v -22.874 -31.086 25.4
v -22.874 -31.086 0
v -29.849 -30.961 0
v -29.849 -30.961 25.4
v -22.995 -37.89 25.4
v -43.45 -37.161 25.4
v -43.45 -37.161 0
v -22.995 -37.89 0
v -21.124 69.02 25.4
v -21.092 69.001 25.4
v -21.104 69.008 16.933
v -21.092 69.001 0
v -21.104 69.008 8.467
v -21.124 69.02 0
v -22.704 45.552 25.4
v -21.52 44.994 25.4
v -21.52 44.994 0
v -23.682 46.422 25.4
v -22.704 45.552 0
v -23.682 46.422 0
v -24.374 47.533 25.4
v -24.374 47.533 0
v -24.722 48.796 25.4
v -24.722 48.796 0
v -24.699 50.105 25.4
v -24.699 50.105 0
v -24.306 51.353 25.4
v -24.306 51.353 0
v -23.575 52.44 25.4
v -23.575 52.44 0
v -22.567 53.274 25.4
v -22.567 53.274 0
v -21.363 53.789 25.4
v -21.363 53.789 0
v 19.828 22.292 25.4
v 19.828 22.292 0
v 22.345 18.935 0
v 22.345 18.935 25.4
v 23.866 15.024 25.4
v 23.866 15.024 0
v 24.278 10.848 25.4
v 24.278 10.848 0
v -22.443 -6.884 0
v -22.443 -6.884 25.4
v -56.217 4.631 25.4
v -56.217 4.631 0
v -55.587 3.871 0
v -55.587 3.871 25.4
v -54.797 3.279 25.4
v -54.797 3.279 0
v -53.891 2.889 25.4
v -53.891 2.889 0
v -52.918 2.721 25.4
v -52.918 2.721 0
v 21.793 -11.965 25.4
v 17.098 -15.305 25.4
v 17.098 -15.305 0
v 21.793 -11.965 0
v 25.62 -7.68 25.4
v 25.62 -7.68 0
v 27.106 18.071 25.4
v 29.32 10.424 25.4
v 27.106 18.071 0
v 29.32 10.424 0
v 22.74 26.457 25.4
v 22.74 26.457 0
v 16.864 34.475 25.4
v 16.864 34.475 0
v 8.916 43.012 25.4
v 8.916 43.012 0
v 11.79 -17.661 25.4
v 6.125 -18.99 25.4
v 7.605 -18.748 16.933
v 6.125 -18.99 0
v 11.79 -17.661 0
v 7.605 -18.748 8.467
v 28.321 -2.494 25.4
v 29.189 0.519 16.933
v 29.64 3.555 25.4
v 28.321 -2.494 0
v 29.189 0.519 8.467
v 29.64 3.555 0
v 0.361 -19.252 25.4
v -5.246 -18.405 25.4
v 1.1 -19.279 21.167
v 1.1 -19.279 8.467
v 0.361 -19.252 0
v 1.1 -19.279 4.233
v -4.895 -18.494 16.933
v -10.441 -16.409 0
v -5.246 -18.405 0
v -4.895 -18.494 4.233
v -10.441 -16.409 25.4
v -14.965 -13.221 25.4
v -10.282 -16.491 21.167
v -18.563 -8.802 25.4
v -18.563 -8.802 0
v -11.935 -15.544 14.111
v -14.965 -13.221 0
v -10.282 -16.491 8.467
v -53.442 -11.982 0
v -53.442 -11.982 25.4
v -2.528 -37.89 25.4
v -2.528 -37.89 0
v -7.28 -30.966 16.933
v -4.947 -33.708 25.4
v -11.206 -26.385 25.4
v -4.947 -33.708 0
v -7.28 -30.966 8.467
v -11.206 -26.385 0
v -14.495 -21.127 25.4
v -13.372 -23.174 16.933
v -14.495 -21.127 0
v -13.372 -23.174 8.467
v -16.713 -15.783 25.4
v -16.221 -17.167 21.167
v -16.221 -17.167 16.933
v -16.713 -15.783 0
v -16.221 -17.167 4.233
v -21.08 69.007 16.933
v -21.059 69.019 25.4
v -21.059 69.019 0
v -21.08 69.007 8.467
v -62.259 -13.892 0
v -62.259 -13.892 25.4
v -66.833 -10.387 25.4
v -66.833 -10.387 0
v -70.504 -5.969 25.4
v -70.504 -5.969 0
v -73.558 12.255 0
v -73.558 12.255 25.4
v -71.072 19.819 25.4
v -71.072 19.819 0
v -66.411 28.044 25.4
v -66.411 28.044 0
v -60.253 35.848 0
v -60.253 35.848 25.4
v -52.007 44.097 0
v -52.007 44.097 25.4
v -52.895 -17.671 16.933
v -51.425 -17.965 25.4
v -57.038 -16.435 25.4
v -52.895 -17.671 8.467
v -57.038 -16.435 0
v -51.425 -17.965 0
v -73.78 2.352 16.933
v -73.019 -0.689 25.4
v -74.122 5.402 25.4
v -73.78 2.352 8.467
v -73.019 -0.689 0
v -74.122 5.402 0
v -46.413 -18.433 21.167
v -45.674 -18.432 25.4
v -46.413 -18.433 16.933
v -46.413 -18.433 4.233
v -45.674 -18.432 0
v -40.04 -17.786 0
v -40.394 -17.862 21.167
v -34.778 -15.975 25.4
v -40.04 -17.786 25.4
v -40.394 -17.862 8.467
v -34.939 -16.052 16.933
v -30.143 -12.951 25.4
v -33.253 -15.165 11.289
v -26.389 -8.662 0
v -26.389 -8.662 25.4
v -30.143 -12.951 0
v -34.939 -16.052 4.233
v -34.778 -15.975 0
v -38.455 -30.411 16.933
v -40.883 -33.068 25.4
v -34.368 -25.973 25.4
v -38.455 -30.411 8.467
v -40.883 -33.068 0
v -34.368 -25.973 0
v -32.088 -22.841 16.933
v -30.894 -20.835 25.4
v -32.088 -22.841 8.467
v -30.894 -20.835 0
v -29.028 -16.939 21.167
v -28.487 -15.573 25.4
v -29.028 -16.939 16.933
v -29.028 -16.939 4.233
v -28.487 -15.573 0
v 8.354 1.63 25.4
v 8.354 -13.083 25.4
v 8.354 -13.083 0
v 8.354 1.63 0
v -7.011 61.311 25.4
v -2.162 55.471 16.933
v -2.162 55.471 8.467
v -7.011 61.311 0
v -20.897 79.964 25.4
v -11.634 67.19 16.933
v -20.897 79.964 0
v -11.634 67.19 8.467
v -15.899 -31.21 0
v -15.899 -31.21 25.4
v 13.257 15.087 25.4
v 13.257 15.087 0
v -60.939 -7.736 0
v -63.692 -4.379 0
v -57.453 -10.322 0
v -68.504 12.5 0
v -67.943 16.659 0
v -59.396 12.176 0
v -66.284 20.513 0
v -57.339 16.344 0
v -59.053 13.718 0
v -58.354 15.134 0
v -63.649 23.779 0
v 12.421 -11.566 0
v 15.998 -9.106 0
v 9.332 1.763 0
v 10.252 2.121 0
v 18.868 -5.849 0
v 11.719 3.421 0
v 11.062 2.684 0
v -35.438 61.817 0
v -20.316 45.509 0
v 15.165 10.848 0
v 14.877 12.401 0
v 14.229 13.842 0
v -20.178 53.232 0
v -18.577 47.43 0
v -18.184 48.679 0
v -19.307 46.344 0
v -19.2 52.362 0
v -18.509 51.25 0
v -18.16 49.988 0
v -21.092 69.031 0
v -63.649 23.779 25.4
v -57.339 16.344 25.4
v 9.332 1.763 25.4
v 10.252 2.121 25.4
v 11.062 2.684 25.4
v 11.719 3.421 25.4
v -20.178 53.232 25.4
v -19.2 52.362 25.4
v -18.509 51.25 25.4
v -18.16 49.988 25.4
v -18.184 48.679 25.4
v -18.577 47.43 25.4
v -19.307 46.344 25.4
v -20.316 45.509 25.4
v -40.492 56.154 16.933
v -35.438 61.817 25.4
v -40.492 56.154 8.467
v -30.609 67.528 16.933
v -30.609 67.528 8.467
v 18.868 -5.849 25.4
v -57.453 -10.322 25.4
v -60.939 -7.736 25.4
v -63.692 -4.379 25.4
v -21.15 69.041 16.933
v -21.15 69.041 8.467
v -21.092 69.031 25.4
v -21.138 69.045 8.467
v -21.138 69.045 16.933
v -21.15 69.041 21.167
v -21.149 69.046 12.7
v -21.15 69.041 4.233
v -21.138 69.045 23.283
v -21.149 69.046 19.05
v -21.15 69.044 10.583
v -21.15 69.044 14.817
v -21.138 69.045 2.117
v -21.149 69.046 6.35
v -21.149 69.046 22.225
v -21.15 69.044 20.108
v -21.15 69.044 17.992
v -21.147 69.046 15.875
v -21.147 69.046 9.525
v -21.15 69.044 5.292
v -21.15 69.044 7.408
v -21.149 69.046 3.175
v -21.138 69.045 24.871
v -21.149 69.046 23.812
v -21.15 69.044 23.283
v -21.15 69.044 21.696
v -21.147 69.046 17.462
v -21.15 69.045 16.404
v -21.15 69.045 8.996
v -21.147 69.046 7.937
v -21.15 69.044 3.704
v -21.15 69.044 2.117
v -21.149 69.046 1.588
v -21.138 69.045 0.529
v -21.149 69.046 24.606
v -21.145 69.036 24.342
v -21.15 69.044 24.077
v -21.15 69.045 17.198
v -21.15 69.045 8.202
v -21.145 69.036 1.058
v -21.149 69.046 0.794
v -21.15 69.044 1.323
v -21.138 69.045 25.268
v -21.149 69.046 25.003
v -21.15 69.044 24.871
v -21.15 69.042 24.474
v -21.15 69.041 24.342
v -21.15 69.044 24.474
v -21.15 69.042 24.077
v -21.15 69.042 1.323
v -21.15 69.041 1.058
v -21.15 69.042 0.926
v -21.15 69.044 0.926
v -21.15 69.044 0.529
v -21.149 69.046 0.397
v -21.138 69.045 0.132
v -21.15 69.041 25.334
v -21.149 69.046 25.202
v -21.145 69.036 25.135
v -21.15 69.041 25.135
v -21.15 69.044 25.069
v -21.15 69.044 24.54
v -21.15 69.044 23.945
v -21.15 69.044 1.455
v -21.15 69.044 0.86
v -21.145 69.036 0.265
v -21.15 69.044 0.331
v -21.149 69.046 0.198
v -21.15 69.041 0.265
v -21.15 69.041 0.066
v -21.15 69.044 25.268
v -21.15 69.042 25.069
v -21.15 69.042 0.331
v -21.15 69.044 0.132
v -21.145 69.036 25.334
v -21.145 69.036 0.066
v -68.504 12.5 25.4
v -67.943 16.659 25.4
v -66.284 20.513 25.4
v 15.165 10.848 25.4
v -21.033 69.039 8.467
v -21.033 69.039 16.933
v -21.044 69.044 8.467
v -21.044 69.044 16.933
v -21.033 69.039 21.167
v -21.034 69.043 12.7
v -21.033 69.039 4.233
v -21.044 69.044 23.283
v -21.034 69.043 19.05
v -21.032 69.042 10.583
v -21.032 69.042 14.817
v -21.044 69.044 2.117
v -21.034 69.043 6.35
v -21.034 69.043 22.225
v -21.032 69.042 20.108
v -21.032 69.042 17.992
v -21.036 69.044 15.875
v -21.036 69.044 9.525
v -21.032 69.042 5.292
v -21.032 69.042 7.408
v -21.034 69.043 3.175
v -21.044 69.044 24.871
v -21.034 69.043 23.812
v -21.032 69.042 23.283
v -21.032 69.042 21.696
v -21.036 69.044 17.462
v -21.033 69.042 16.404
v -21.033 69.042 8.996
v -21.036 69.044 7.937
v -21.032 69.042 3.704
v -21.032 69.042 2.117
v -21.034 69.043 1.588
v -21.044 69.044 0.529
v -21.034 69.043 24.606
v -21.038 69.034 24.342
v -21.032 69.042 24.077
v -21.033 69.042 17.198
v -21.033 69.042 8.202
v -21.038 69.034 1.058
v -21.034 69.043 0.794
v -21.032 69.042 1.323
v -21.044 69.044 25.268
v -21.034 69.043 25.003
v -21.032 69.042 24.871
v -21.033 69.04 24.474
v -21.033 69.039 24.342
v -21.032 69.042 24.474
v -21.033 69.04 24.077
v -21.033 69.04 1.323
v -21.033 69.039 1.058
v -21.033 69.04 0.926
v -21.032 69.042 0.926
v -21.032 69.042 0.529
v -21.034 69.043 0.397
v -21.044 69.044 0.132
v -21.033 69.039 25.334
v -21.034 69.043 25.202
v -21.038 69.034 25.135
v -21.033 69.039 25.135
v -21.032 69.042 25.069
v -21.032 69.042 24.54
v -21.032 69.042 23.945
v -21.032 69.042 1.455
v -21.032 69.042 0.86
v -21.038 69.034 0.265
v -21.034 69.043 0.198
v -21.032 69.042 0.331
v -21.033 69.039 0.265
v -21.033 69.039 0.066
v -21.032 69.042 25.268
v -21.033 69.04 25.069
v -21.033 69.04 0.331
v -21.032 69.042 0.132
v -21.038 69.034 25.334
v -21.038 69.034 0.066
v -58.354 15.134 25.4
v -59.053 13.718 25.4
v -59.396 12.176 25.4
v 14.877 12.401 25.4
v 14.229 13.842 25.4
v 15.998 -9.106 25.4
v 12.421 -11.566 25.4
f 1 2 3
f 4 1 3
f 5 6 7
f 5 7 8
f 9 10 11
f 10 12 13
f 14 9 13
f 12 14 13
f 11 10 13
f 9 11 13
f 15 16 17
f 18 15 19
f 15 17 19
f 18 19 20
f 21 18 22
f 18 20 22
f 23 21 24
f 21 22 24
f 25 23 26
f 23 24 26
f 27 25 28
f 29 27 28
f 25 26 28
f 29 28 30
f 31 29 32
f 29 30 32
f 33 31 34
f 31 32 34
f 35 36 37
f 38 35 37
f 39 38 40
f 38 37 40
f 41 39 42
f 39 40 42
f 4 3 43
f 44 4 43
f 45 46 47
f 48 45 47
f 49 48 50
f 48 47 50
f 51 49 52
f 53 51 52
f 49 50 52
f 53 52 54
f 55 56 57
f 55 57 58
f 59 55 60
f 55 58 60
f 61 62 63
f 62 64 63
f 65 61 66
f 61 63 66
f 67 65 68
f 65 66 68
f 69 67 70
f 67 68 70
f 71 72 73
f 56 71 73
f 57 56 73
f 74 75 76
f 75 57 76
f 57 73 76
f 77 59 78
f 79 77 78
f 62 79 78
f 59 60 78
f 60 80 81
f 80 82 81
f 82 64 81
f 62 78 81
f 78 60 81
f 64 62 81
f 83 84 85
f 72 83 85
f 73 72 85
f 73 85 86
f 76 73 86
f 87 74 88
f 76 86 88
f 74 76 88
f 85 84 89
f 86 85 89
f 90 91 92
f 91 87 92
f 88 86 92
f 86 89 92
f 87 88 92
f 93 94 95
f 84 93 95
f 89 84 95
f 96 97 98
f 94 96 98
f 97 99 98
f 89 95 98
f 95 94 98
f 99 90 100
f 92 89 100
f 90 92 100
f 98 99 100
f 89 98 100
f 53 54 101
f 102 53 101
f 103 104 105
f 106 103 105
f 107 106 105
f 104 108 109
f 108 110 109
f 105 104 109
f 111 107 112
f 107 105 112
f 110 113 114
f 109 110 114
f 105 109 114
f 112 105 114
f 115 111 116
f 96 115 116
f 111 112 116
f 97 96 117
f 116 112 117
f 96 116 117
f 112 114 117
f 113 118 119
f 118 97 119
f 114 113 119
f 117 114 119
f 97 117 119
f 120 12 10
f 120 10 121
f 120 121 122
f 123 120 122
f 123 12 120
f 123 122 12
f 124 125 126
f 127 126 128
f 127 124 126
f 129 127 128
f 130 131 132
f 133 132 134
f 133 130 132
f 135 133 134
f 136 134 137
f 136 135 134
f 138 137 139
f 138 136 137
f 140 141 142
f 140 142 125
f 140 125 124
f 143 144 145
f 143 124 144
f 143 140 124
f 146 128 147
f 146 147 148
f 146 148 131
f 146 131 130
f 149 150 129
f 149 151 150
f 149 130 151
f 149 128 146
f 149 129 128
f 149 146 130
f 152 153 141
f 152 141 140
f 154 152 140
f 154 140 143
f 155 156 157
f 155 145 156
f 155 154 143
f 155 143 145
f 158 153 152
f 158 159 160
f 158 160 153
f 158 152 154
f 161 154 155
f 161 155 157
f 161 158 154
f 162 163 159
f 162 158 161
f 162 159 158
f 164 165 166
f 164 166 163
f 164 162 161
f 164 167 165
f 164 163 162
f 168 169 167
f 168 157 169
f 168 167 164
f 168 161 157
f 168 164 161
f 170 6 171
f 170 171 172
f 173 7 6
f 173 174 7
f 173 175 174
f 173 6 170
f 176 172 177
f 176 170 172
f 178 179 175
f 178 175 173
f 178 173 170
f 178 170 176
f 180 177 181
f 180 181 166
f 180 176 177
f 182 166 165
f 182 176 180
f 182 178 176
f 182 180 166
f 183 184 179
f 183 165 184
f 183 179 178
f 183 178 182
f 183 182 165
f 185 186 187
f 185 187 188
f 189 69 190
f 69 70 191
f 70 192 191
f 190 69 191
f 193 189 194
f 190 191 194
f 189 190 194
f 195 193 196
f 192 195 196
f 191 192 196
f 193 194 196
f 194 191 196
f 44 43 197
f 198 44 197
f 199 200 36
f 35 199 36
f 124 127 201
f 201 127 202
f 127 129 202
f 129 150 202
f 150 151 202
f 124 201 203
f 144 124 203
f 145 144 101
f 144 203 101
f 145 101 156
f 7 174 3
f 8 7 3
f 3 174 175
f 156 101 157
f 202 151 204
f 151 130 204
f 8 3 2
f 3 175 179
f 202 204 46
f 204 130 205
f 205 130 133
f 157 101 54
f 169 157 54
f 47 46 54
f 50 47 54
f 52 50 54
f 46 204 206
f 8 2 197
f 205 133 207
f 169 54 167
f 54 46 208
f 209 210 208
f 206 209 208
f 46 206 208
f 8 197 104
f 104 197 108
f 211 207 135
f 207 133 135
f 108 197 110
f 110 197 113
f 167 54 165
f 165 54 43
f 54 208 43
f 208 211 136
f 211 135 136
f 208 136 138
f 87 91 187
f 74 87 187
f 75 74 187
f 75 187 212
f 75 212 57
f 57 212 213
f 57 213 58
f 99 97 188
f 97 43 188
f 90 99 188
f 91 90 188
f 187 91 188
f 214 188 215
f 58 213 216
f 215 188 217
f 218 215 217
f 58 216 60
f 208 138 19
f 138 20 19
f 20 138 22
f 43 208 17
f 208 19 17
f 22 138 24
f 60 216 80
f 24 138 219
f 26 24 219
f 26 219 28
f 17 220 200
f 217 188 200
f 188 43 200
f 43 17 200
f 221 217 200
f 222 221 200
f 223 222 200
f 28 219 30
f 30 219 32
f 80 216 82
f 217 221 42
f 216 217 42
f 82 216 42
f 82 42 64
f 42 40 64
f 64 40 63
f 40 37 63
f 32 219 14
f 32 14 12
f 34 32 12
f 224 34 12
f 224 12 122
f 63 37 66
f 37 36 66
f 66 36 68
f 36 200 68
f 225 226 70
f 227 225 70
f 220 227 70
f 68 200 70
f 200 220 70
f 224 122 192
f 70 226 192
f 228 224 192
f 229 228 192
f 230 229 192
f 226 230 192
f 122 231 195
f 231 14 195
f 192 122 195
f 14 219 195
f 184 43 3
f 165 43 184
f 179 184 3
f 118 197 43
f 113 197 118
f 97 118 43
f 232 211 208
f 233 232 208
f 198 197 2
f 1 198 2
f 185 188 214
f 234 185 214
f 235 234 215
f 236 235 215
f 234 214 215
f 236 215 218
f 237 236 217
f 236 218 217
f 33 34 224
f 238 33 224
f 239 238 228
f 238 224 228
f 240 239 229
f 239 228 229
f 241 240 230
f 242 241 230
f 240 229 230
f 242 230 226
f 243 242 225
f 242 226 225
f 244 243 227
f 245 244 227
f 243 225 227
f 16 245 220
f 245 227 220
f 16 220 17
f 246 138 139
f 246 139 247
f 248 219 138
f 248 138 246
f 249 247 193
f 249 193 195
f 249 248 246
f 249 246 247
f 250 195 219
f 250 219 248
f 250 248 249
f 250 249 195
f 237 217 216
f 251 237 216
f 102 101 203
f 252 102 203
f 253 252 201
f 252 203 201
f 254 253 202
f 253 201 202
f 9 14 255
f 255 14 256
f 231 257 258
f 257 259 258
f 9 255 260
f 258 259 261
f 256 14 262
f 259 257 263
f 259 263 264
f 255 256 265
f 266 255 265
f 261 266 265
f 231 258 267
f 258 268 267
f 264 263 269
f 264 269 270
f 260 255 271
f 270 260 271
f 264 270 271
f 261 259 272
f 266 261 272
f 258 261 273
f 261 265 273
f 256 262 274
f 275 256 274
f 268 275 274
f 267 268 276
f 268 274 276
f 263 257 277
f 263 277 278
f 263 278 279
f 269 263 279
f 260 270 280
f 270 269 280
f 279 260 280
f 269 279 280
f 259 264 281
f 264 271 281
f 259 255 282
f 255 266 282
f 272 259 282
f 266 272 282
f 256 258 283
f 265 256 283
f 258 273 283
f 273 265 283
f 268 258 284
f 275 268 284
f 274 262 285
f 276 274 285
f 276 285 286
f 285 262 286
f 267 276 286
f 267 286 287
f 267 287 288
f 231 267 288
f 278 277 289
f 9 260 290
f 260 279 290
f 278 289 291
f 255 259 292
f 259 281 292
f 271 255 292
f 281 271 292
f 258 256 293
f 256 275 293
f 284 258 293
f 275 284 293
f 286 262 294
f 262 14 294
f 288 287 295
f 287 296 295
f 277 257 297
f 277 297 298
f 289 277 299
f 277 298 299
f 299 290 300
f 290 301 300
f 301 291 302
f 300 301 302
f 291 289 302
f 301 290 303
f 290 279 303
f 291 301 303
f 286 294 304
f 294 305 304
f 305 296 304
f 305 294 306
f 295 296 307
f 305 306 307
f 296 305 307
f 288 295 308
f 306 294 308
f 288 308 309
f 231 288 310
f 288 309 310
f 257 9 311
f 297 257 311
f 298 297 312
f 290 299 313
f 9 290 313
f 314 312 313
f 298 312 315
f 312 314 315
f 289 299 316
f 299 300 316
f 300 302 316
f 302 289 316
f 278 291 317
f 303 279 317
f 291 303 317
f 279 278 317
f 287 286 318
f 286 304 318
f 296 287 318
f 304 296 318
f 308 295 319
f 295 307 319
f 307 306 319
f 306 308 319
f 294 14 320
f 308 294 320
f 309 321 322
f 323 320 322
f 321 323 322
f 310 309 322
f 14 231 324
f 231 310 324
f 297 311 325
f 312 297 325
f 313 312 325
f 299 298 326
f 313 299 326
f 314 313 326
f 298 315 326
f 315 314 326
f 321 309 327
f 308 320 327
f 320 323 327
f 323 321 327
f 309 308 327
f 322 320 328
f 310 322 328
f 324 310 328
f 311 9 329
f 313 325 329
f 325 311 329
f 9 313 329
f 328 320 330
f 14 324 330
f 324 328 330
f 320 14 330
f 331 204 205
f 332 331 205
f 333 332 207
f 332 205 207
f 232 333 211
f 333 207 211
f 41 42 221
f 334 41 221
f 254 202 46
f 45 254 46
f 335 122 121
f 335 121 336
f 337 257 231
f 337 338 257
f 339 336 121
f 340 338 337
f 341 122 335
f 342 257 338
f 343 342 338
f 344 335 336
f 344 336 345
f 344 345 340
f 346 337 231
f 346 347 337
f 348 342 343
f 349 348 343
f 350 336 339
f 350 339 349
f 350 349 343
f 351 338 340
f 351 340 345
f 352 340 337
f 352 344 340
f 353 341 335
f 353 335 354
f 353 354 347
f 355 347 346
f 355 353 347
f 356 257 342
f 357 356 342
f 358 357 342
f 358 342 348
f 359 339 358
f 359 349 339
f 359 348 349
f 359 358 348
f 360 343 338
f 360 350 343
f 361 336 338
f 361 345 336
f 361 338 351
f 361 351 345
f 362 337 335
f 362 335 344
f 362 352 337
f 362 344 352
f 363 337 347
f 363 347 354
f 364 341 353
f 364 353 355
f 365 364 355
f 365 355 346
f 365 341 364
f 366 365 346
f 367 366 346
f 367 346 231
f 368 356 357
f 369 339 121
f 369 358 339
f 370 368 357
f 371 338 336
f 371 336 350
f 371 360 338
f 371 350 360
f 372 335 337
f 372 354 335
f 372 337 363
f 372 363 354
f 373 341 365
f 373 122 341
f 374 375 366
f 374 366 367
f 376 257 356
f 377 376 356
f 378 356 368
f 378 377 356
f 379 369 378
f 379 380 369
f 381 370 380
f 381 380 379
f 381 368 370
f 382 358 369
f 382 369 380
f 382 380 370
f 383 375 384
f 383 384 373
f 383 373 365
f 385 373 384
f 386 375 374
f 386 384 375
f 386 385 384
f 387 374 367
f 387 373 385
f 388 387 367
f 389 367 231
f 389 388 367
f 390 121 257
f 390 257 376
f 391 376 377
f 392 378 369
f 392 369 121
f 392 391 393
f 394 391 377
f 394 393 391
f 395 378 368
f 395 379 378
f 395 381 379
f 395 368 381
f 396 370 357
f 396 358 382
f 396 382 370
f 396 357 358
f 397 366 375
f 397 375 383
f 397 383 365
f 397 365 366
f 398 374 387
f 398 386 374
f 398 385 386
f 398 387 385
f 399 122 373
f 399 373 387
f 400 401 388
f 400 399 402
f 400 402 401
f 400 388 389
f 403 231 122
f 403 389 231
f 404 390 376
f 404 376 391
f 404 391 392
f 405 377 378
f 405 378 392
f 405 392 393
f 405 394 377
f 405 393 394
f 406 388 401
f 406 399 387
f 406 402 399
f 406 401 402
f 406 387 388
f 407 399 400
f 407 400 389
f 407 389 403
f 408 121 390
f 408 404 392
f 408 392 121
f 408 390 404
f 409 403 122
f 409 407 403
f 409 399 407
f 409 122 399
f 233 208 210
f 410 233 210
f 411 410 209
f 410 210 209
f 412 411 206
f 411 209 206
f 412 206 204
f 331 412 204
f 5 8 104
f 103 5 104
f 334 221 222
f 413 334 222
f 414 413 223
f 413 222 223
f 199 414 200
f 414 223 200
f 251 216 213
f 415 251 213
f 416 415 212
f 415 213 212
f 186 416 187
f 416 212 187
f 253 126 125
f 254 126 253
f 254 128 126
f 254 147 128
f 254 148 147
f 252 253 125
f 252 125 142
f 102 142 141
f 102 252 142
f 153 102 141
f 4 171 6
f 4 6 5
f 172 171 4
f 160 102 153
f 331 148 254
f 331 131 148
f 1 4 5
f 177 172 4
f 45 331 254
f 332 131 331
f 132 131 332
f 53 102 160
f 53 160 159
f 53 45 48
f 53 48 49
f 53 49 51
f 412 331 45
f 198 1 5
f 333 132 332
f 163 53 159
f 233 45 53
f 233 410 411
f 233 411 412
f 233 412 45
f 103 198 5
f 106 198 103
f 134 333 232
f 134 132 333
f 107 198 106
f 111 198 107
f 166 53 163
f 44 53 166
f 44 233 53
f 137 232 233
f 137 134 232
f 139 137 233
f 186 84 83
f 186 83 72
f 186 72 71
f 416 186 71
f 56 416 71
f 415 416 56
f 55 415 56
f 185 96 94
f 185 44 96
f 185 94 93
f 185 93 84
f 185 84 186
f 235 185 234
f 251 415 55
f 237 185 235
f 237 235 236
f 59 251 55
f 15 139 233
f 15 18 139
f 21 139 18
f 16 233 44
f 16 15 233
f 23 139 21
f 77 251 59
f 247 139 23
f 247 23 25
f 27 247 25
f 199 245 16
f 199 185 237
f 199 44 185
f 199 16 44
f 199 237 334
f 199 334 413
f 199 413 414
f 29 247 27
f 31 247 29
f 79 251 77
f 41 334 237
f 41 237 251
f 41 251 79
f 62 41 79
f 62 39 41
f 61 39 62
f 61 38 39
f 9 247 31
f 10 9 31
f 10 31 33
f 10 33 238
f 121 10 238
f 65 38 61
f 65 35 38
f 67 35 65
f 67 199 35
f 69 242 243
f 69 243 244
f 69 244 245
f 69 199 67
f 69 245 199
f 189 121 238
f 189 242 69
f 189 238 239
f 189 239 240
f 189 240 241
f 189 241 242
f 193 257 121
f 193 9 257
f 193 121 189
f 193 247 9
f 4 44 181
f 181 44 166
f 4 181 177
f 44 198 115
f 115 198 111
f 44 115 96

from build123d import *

# Parameters (mm, degrees)
F0_W     = 4.7442697883
F0_H     = 1.9113573674
F0_W_2   = 4.7634891234
F0_H_2   = 1.468620263
F0_W_3   = 4.128358094
F0_H_3   = 1.4289282262
F1_DEPTH = 25.4


# Not quite as in the source:
# - a feature names something its author has since deleted; it is built from what else it names


with BuildPart() as f1:
    # F0 (on Top) → F1 (new body)
    with BuildSketch(Plane.XY):
        with BuildLine():
            Line((-22.9954444695, -37.8900244832), (-2.5283634938, -37.8900244832))
            add(Edge.make_bspline(
                [(-2.5283634938, -37.8900244832), (-5.8608135484, -29.4962804765), (-14.5712196827, -28.3677466214), (-18.5634065419, -8.8018402457)],
                knots=[0, 0, 0, 0, 33.2151331141, 33.2151331141, 33.2151331141, 33.2151331141], degree=3))
            add(Edge.make_bspline(
                [(-18.5634065419, -8.8018402457), (-2.5283634938, -35.3494078415), (62.5428706408, -9.0993279591), (8.9163342491, 43.0122725666)],
                knots=[0, 0, 0, 0, 58.6501358947, 58.6501358947, 58.6501358947, 58.6501358947], degree=3))
            add(Edge.make_bspline(
                [(8.9163342491, 43.0122725666), (-3.4306221642, 56.4400143921), (-11.2726483494, 66.0635232925), (-20.8969525993, 79.9641385674)],
                knots=[0, 0, 0, 0, 47.47917937, 47.47917937, 47.47917937, 47.47917937], degree=3))
            add(Edge.make_bspline(
                [(-52.0068416032, 44.0970606294), (-39.1896790872, 57.0767342864), (-31.0100233031, 66.4149637492), (-20.8969525993, 79.9641385674)],
                knots=[0, 0, 0, 0, 47.47917937, 47.47917937, 47.47917937, 47.47917937], degree=3))
            add(Edge.make_bspline(
                [(-26.3891224094, -8.6624968343), (-43.3591045439, -34.6223823726), (-107.454577438, -6.07238132), (-52.0068416032, 44.0970606294)],
                knots=[0, 0, 0, 0, 58.6501358947, 58.6501358947, 58.6501358947, 58.6501358947], degree=3))
            add(Edge.make_bspline(
                [(-43.4495514732, -37.1613885312), (-39.8203933268, -28.8916017766), (-31.0753324327, -28.0738771005), (-26.3891224094, -8.6624968343)],
                knots=[0, 0, 0, 0, 33.2151331141, 33.2151331141, 33.2151331141, 33.2151331141], degree=3))
            Line((-43.4495514732, -37.1613885312), (-22.9954444695, -37.8900244832))
        make_face()
        Polygon((-29.84915008, -30.9614511052), (-22.4433610347, -6.8842664576), (-15.8994235098, -31.2098376453), (-22.8742867949, -31.0856443752), align=None, mode=Mode.SUBTRACT)
        with BuildLine():
            add(Edge.make_bspline(
                [(-22.3207809169, 0), (-10.655029352, -32.6894562044), (59.6865899861, -11.1531224102), (7.7575119212, 41.9883653522)],
                knots=[0, 0, 0, 0, 51.6500389642, 51.6500389642, 51.6500389642, 51.6500389642], degree=3))
            add(Edge.make_bspline(
                [(-22.3207809169, 0), (-35.1428948343, -32.2534292936), (-104.6732232363, -8.2265585713), (-50.8852053371, 43.0325479438)],
                knots=[0, 0, 0, 0, 51.6500389642, 51.6500389642, 51.6500389642, 51.6500389642], degree=3))
            Line((-50.8852053371, 43.0325479438), (-20.973111277, 75.6869634445))
            Line((-20.973111277, 75.6869634445), (7.7575119212, 41.9883653522))
        make_face(mode=Mode.SUBTRACT)
        with BuildLine():
            add(Edge.make_bspline(
                [(-22.3207809169, 0), (-35.1428948343, -32.2534292936), (-104.6732232363, -8.2265585713), (-50.8852053371, 43.0325479438)],
                knots=[0, 0, 0, 0, 51.6500389642, 51.6500389642, 51.6500389642, 51.6500389642], degree=3))
            add(Edge.make_bspline(
                [(-22.3207809169, 0), (-10.655029352, -32.6894562044), (59.6865899861, -11.1531224102), (7.7575119212, 41.9883653522)],
                knots=[0, 0, 0, 0, 51.6500389642, 51.6500389642, 51.6500389642, 51.6500389642], degree=3))
            Line((7.7575119212, 41.9883653522), (-20.973111277, 75.6869634445))
            Line((-20.973111277, 75.6869634445), (-50.8852053371, 43.0325479438))
        make_face()
        with BuildLine():
            ThreePointArc((-53.4419212435, -11.9822170834), (-59.2752805035, -9.1359017891), (-63.691800004, -4.379438133))
            Line((-63.691800004, -4.379438133), (-56.2167386264, 4.6310161836))
            ThreePointArc((-56.2167386264, 4.6310161836), (-54.7973483092, 3.2789986514), (-52.9181442541, 2.7211345107))
            Line((-52.9181442541, 2.7211345107), (-53.4419212435, -11.9822170834))
        make_face(mode=Mode.SUBTRACT)
        with BuildLine():
            Line((-59.3962358793, 12.1757701265), (-68.5043031466, 12.5002264942))
            ThreePointArc((-68.5043031466, 12.5002264942), (-67.2450849294, 18.6426159936), (-63.6487509213, 23.7788559591))
            Line((-63.6487509213, 23.7788559591), (-57.3389988191, 16.3438184143))
            ThreePointArc((-57.3389988191, 16.3438184143), (-58.7463070002, 14.4467053449), (-59.3962358793, 12.1757701265))
        make_face(mode=Mode.SUBTRACT)
        with BuildLine():
            ThreePointArc((18.8681036234, -5.8494862169), (14.2850517957, -10.4457049841), (8.3540603518, -13.082546182))
            Line((8.3540603518, -13.082546182), (8.3540603518, 1.6301316991))
            ThreePointArc((8.3540603518, 1.6301316991), (10.2519333675, 2.1207418259), (11.7185562849, 3.4213714805))
            Line((11.7185562849, 3.4213714805), (18.8681036234, -5.8494862169))
        make_face(mode=Mode.SUBTRACT)
        with BuildLine():
            ThreePointArc((19.8275279254, 22.2924910486), (23.2387301192, 17.0314760444), (24.2784786969, 10.8481515199))
            Line((24.2784786969, 10.8481515199), (15.1646342129, 10.8481515199))
            ThreePointArc((15.1646342129, 10.8481515199), (14.5959634871, 13.1407849228), (13.2570853457, 15.0867961347))
            Line((13.2570853457, 15.0867961347), (19.8275279254, 22.2924910486))
        make_face(mode=Mode.SUBTRACT)
        with BuildLine():
            add(Edge.make_bspline(
                [(-21.124196495, 69.0203205478), (-22.2645987992, 68.6191021406), (-33.580908588, 63.0681711425), (-30.2861785142, 48.5103170354)],
                knots=[1.924853553, 1.924853553, 1.924853553, 1.924853553, 22.4584134886, 22.4584134886, 22.4584134886, 22.4584134886], degree=3))
            add(Edge.make_bspline(
                [(-21.124196495, 69.0203205478), (-21.1691445632, 69.0500857695), (-21.1554459369, 69.0540761805), (-21.0916213723, 69.0312749979)],
                knots=[0.2728391378, 0.2728391378, 0.2728391378, 0.2728391378, 1.7089042388, 1.7089042388, 1.7089042388, 1.7089042388], degree=3))
            add(Edge.make_bspline(
                [(-21.0594568815, 69.0191678049), (-21.0134776523, 69.04731399), (-21.027025535, 69.0517895479), (-21.0916213723, 69.0312749979)],
                knots=[0.2728391378, 0.2728391378, 0.2728391378, 0.2728391378, 1.7089042388, 1.7089042388, 1.7089042388, 1.7089042388], degree=3))
            add(Edge.make_bspline(
                [(-21.0594568815, 69.0191678049), (-19.9340610017, 68.5776049674), (-8.8225398383, 62.627327695), (-12.633446604, 48.1959953904)],
                knots=[1.924853553, 1.924853553, 1.924853553, 1.924853553, 22.4584134886, 22.4584134886, 22.4584134886, 22.4584134886], degree=3))
            add(Edge.make_bspline(
                [(-12.633446604, 48.1959953904), (-4.4782049954, 44.5908084512), (-1.012446126, 42.8227111697), (4.8599806614, 35.9290093184)],
                knots=[0, 0, 0, 0, 21.3658359252, 21.3658359252, 21.3658359252, 21.3658359252], degree=3))
            Line((4.8599806614, 35.9290093184), (8.7451650402, 35.4348045049))
            Line((8.7451650402, 35.4348045049), (12.5032669737, 31.2499941052))
            add(Edge.make_bspline(
                [(12.5032669737, 31.2499941052), (8.0707731529, 17.1092335792), (6.1978180893, 11.1496476457), (4.9289693125, -2.2719807457)],
                knots=[0, 0, 0, 0, 34.3670304648, 34.3670304648, 34.3670304648, 34.3670304648], degree=3))
            Line((4.9289693125, -2.2719807457), (-17.9089047015, -2.2719807457))
            Line((-17.9089047015, -2.2719807457), (-22.3005021556, 1.1388828675))
            Line((-22.3005021556, 1.1388828675), (-26.8107438558, -2.1134760598))
            Line((-26.8107438558, -2.1134760598), (-49.6341410648, -1.3004389641))
            add(Edge.make_bspline(
                [(-56.0102422262, 32.469934397), (-52.083974651, 18.1803391384), (-50.4243703941, 12.1578530338), (-49.6341410648, -1.3004389641)],
                knots=[0, 0, 0, 0, 34.3670304648, 34.3670304648, 34.3670304648, 34.3670304648], degree=3))
            Line((-56.0102422262, 32.469934397), (-52.105541674, 36.5183021942))
            Line((-52.105541674, 36.5183021942), (-48.2052262113, 36.8738796762))
            add(Edge.make_bspline(
                [(-30.2861785142, 48.5103170354), (-38.5645966004, 45.1977451416), (-42.0911034871, 43.5541509957), (-48.2052262113, 36.8738796762)],
                knots=[0, 0, 0, 0, 21.3658359252, 21.3658359252, 21.3658359252, 21.3658359252], degree=3))
        make_face(mode=Mode.SUBTRACT)
        with BuildLine():
            add(Edge.make_bspline(
                [(-21.0921680822, 69.000571026), (-21.0790768616, 69.0076183464), (-21.0681925114, 69.013820289), (-21.0594568815, 69.0191678049)],
                knots=[0, 0, 0, 0, 0.2728391378, 0.2728391378, 0.2728391378, 0.2728391378], degree=3))
            add(Edge.make_bspline(
                [(-21.0921680822, 69.000571026), (-21.1050001171, 69.0080799317), (-21.1156567762, 69.01466543), (-21.124196495, 69.0203205478)],
                knots=[0, 0, 0, 0, 0.2728391378, 0.2728391378, 0.2728391378, 0.2728391378], degree=3))
            add(Edge.make_bspline(
                [(-21.124196495, 69.0203205478), (-22.2645987992, 68.6191021406), (-33.580908588, 63.0681711425), (-30.2861785142, 48.5103170354)],
                knots=[1.924853553, 1.924853553, 1.924853553, 1.924853553, 22.4584134886, 22.4584134886, 22.4584134886, 22.4584134886], degree=3))
            add(Edge.make_bspline(
                [(-30.2861785142, 48.5103170354), (-38.5645966004, 45.1977451416), (-42.0911034871, 43.5541509957), (-48.2052262113, 36.8738796762)],
                knots=[0, 0, 0, 0, 21.3658359252, 21.3658359252, 21.3658359252, 21.3658359252], degree=3))
            Line((-48.2052262113, 36.8738796762), (-52.105541674, 36.5183021942))
            Line((-52.105541674, 36.5183021942), (-56.0102422262, 32.469934397))
            add(Edge.make_bspline(
                [(-56.0102422262, 32.469934397), (-52.083974651, 18.1803391384), (-50.4243703941, 12.1578530338), (-49.6341410648, -1.3004389641)],
                knots=[0, 0, 0, 0, 34.3670304648, 34.3670304648, 34.3670304648, 34.3670304648], degree=3))
            Line((-49.6341410648, -1.3004389641), (-26.8107438558, -2.1134760598))
            Line((-26.8107438558, -2.1134760598), (-22.3005021556, 1.1388828675))
            Line((-22.3005021556, 1.1388828675), (-17.9089047015, -2.2719807457))
            Line((-17.9089047015, -2.2719807457), (4.9289693125, -2.2719807457))
            add(Edge.make_bspline(
                [(12.5032669737, 31.2499941052), (8.0707731529, 17.1092335792), (6.1978180893, 11.1496476457), (4.9289693125, -2.2719807457)],
                knots=[0, 0, 0, 0, 34.3670304648, 34.3670304648, 34.3670304648, 34.3670304648], degree=3))
            Line((12.5032669737, 31.2499941052), (8.7451650402, 35.4348045049))
            Line((8.7451650402, 35.4348045049), (4.8599806614, 35.9290093184))
            add(Edge.make_bspline(
                [(-12.633446604, 48.1959953904), (-4.4782049954, 44.5908084512), (-1.012446126, 42.8227111697), (4.8599806614, 35.9290093184)],
                knots=[0, 0, 0, 0, 21.3658359252, 21.3658359252, 21.3658359252, 21.3658359252], degree=3))
            add(Edge.make_bspline(
                [(-21.0594568815, 69.0191678049), (-19.9340610017, 68.5776049674), (-8.8225398383, 62.627327695), (-12.633446604, 48.1959953904)],
                knots=[1.924853553, 1.924853553, 1.924853553, 1.924853553, 22.4584134886, 22.4584134886, 22.4584134886, 22.4584134886], degree=3))
        make_face()
        with BuildLine():
            Line((1.5771253966, 0.8908104501), (-22.3005021556, 1.1388828675))
            Line((-22.3005021556, 1.1388828675), (-46.171825282, 1.7410204233))
            add(Edge.make_bspline(
                [(-46.171825282, 1.7410204233), (-45.7708157439, 13.1605637788), (-52.73816584, 22.5929590908), (-52.6217791411, 31.8137129357)],
                knots=[0, 0, 0, 0, 30.7566048147, 30.7566048147, 30.7566048147, 30.7566048147], degree=3))
            Line((-52.6217791411, 31.8137129357), (-47.394574231, 32.6878372218))
            add(Edge.make_bspline(
                [(-47.394574231, 32.6878372218), (-46.4944956501, 34.1402371022), (-39.9368781188, 45.5703020096), (-25.2081565999, 45.257687461)],
                knots=[0, 0, 0, 0, 25.4997698487, 25.4997698487, 25.4997698487, 25.4997698487], degree=3))
            add(Edge.make_bspline(
                [(-25.2081565999, 45.257687461), (-27.3981189013, 47.5347847087), (-28.8692938451, 52.2527268432), (-23.2430618726, 54.7112649227)],
                knots=[0, 0, 0, 0, 9.6556576219, 9.6556576219, 9.6556576219, 9.6556576219], degree=3))
            add(Edge.make_bspline(
                [(-23.2430618726, 54.7112649227), (-23.6007135185, 54.974488922), (-23.6778442933, 55.2155826969), (-23.7461169911, 55.6965485296)],
                knots=[0, 0, 0, 0, 1.1062767458, 1.1062767458, 1.1062767458, 1.1062767458], degree=3))
            Line((-23.7461169911, 55.6965485296), (-26.8019135259, 55.2128791863))
            Line((-26.8019135259, 55.2128791863), (-27.3837317159, 58.8887747819))
            Line((-27.3837317159, 58.8887747819), (-26.355564632, 58.8704674077))
            Line((-26.355564632, 58.8704674077), (-26.287410087, 60.7836866964))
            Line((-26.287410087, 60.7836866964), (-24.6665124446, 60.7548252592))
            Line((-24.6665124446, 60.7548252592), (-24.708365393, 62.4893900249))
            Line((-24.708365393, 62.4893900249), (-23.3507940795, 62.5529359414))
            Line((-23.3507940795, 62.5529359414), (-23.2916032165, 64.2145287318))
            Line((-23.2916032165, 64.2145287318), (-21.1709695666, 64.5749722779))
            Line((-21.1709695666, 64.5749722779), (-19.0645121038, 64.1392618418))
            Line((-19.0645121038, 64.1392618418), (-19.0645121038, 62.4766151085))
            Line((-19.0645121038, 62.4766151085), (-17.7100636065, 62.3647794127))
            Line((-17.7100636065, 62.3647794127), (-17.8136411971, 60.6328041593))
            Line((-17.8136411971, 60.6328041593), (-16.1927435547, 60.6039427221))
            Line((-16.1927435547, 60.6039427221), (-16.1927435547, 58.6895098848))
            Line((-16.1927435547, 58.6895098848), (-15.1645764709, 58.6712025106))
            Line((-15.1645764709, 58.6712025106), (-15.876889146, 55.0183499966))
            Line((-15.876889146, 55.0183499966), (-18.9135298133, 55.6105002761))
            add(Edge.make_bspline(
                [(-19.4513425231, 54.6437501907), (-19.084546715, 54.8940747976), (-18.998881802, 55.1322698593), (-18.9135298133, 55.6105002761)],
                knots=[0, 0, 0, 0, 1.1062767458, 1.1062767458, 1.1062767458, 1.1062767458], degree=3))
            add(Edge.make_bspline(
                [(-17.8240444511, 45.1262071729), (-15.5544048175, 47.323897481), (-13.9162018895, 51.9864745438), (-19.4513425231, 54.6437501907)],
                knots=[0, 0, 0, 0, 9.6556576219, 9.6556576219, 9.6556576219, 9.6556576219], degree=3))
            add(Edge.make_bspline(
                [(3.9008178283, 31.7744798958), (3.0530157965, 33.2580022514), (-3.0935301911, 44.9142754078), (-17.8240444511, 45.1262071729)],
                knots=[0, 0, 0, 0, 25.4997698487, 25.4997698487, 25.4997698487, 25.4997698487], degree=3))
            Line((3.9008178283, 31.7744798958), (9.0935900807, 30.7148192078))
            add(Edge.make_bspline(
                [(1.5771253966, 0.8908104501), (1.5829101903, 12.3173911124), (8.8816406205, 21.4957669377), (9.0935900807, 30.7148192078)],
                knots=[0, 0, 0, 0, 30.7566048147, 30.7566048147, 30.7566048147, 30.7566048147], degree=3))
        make_face(mode=Mode.SUBTRACT)
        with BuildLine():
            Line((-46.171825282, 1.7410204233), (-22.3005021556, 1.1388828675))
            Line((-22.3005021556, 1.1388828675), (1.5771253966, 0.8908104501))
            add(Edge.make_bspline(
                [(1.5771253966, 0.8908104501), (1.5829101903, 12.3173911124), (8.8816406205, 21.4957669377), (9.0935900807, 30.7148192078)],
                knots=[0, 0, 0, 0, 30.7566048147, 30.7566048147, 30.7566048147, 30.7566048147], degree=3))
            Line((9.0935900807, 30.7148192078), (3.9008178283, 31.7744798958))
            add(Edge.make_bspline(
                [(3.9008178283, 31.7744798958), (3.0530157965, 33.2580022514), (-3.0935301911, 44.9142754078), (-17.8240444511, 45.1262071729)],
                knots=[0, 0, 0, 0, 25.4997698487, 25.4997698487, 25.4997698487, 25.4997698487], degree=3))
            add(Edge.make_bspline(
                [(-17.8240444511, 45.1262071729), (-15.5544048175, 47.323897481), (-13.9162018895, 51.9864745438), (-19.4513425231, 54.6437501907)],
                knots=[0, 0, 0, 0, 9.6556576219, 9.6556576219, 9.6556576219, 9.6556576219], degree=3))
            add(Edge.make_bspline(
                [(-19.4513425231, 54.6437501907), (-19.084546715, 54.8940747976), (-18.998881802, 55.1322698593), (-18.9135298133, 55.6105002761)],
                knots=[0, 0, 0, 0, 1.1062767458, 1.1062767458, 1.1062767458, 1.1062767458], degree=3))
            Line((-18.9135298133, 55.6105002761), (-15.876889146, 55.0183499966))
            Line((-15.876889146, 55.0183499966), (-15.1645764709, 58.6712025106))
            Line((-15.1645764709, 58.6712025106), (-16.1927435547, 58.6895098848))
            Line((-16.1927435547, 58.6895098848), (-16.1927435547, 60.6039427221))
            Line((-16.1927435547, 60.6039427221), (-17.8136411971, 60.6328041593))
            Line((-17.8136411971, 60.6328041593), (-17.7100636065, 62.3647794127))
            Line((-17.7100636065, 62.3647794127), (-19.0645121038, 62.4766151085))
            Line((-19.0645121038, 62.4766151085), (-19.0645121038, 64.1392618418))
            Line((-19.0645121038, 64.1392618418), (-21.1709695666, 64.5749722779))
            Line((-21.1709695666, 64.5749722779), (-23.2916032165, 64.2145287318))
            Line((-23.2916032165, 64.2145287318), (-23.3507940795, 62.5529359414))
            Line((-23.3507940795, 62.5529359414), (-24.708365393, 62.4893900249))
            Line((-24.708365393, 62.4893900249), (-24.6665124446, 60.7548252592))
            Line((-24.6665124446, 60.7548252592), (-26.287410087, 60.7836866964))
            Line((-26.287410087, 60.7836866964), (-26.355564632, 58.8704674077))
            Line((-26.355564632, 58.8704674077), (-27.3837317159, 58.8887747819))
            Line((-27.3837317159, 58.8887747819), (-26.8019135259, 55.2128791863))
            Line((-26.8019135259, 55.2128791863), (-23.7461169911, 55.6965485296))
            add(Edge.make_bspline(
                [(-23.2430618726, 54.7112649227), (-23.6007135185, 54.974488922), (-23.6778442933, 55.2155826969), (-23.7461169911, 55.6965485296)],
                knots=[0, 0, 0, 0, 1.1062767458, 1.1062767458, 1.1062767458, 1.1062767458], degree=3))
            add(Edge.make_bspline(
                [(-25.2081565999, 45.257687461), (-27.3981189013, 47.5347847087), (-28.8692938451, 52.2527268432), (-23.2430618726, 54.7112649227)],
                knots=[0, 0, 0, 0, 9.6556576219, 9.6556576219, 9.6556576219, 9.6556576219], degree=3))
            add(Edge.make_bspline(
                [(-47.394574231, 32.6878372218), (-46.4944956501, 34.1402371022), (-39.9368781188, 45.5703020096), (-25.2081565999, 45.257687461)],
                knots=[0, 0, 0, 0, 25.4997698487, 25.4997698487, 25.4997698487, 25.4997698487], degree=3))
            Line((-47.394574231, 32.6878372218), (-52.6217791411, 31.8137129357))
            add(Edge.make_bspline(
                [(-46.171825282, 1.7410204233), (-45.7708157439, 13.1605637788), (-52.73816584, 22.5929590908), (-52.6217791411, 31.8137129357)],
                knots=[0, 0, 0, 0, 30.7566048147, 30.7566048147, 30.7566048147, 30.7566048147], degree=3))
        make_face()
        Polygon((-44.7576590216, 15.5055557954), (-37.679395917, 15.2534070716), (-35.1471528411, 12.5197675079), (-37.679395917, 10.3981904904), (-44.9303970315, 10.6564926543), align=None, mode=Mode.SUBTRACT)
        Polygon((-30.9412721545, 12.0524866506), (-29.4437312744, 13.5210845619), (-27.8865820009, 12.0524866506), (-29.4437312744, 10.525432397), align=None, mode=Mode.SUBTRACT)
        Polygon((-44.3688373522, 8.0533013785), (-22.1914521969, 7.263277148), (0, 7.263277148), (0, 2.287469827), (-22.2800506048, 2.287469827), (-44.5459780059, 3.0806481949), align=None, mode=Mode.SUBTRACT)
        Polygon((-14.8276363188, 10.2651806109), (-16.3294348053, 11.8467019859), (-14.72098995, 13.2589338481), (-13.2766810033, 11.7379538419), align=None, mode=Mode.SUBTRACT)
        Polygon((-9.0568310236, 12.0552075228), (-6.4288745034, 14.6969654201), (0.65387832, 14.6969654201), (0.65387832, 9.8448265344), (-6.6017220804, 9.8448265344), align=None, mode=Mode.SUBTRACT)
        with BuildLine():
            Line((-40.1418328888, 18.7965188536), (-46.5573088461, 19.0250571336))
            ThreePointArc((-46.5573088461, 19.0250571336), (-39.2386461395, 33.6660544705), (-24.1943614945, 40.115172732))
            Line((-24.1943614945, 40.115172732), (-24.3272148478, 32.6539473716))
            Line((-24.3272148478, 32.6539473716), (-26.0486511449, 32.6845989835))
            Line((-26.0486511449, 32.6845989835), (-26.1316949705, 28.0207445723))
            Line((-26.1316949705, 28.0207445723), (-29.55665306, 28.0817288135))
            Line((-29.55665306, 28.0817288135), (-29.6034895982, 25.4513250038))
            Line((-29.6034895982, 25.4513250038), (-29.7527835425, 21.2603784792))
            Line((-29.7527835425, 21.2603784792), (-25.7005311791, 21.1160252323))
            Line((-25.7005311791, 21.1160252323), (-25.7912743076, 18.568704235))
            Line((-25.7912743076, 18.568704235), (-33.0961882413, 17.6953475839))
            Line((-33.0961882413, 17.6953475839), (-35.7368813782, 22.7922350813))
            Line((-35.7368813782, 22.7922350813), (-32.84917873, 25.5710387789))
            Line((-32.84917873, 25.5710387789), (-36.9155790608, 29.7967978759))
            Line((-36.9155790608, 29.7967978759), (-40.934720905, 25.9292229978))
            Line((-40.934720905, 25.9292229978), (-38.0526815829, 22.9342390088))
            Line((-38.0526815829, 22.9342390088), (-40.1418328888, 18.7965188536))
        make_face(mode=Mode.SUBTRACT)
        with BuildLine():
            ThreePointArc((-21.5435338647, 43.6512536062), (-7.2201754113, 40.2072674631), (2.8851975221, 29.4880755246))
            Line((2.8851975221, 29.4880755246), (6.9841672666, 28.7952069193))
            Line((6.9841672666, 28.7952069193), (6.6132862121, 26.9937831908))
            Line((6.6132862121, 26.9937831908), (2.1097264253, 27.6295803487))
            ThreePointArc((2.1097264253, 27.6295803487), (-7.5677131963, 38.4280486782), (-21.5694110126, 42.1979577158))
            ThreePointArc((-21.5694110126, 42.1979577158), (-35.6964434395, 38.9289042288), (-45.7521782087, 28.4818015615))
            Line((-45.7521782087, 28.4818015615), (-50.2755178366, 28.006735892))
            Line((-50.2755178366, 28.006735892), (-50.5820324143, 29.8202212158))
            Line((-50.5820324143, 29.8202212158), (-46.4609945958, 30.3667257165))
            ThreePointArc((-46.4609945958, 30.3667257165), (-35.9804200494, 40.7193676554), (-21.5435338647, 43.6512536062))
        make_face(mode=Mode.SUBTRACT)
        with BuildLine():
            Line((-19.1531257722, 32.5618183913), (-19.0202724189, 40.0230437517))
            ThreePointArc((-19.0202724189, 40.0230437517), (-4.2151153543, 33.0424312338), (2.5776829571, 18.1501675397))
            Line((2.5776829571, 18.1501675397), (-3.8418623153, 18.1501675397))
            Line((-3.8418623153, 18.1501675397), (-5.7823848911, 22.3596394062))
            Line((-5.7823848911, 22.3596394062), (-2.7955498966, 25.250123183))
            Line((-2.7955498966, 25.250123183), (-6.6744568758, 29.2583294213))
            Line((-6.6744568758, 29.2583294213), (-10.888718186, 25.1800144253))
            Line((-10.888718186, 25.1800144253), (-8.101772517, 22.3001688719))
            Line((-8.101772517, 22.3001688719), (-10.9222428873, 17.3005219549))
            Line((-10.9222428873, 17.3005219549), (-18.191434443, 18.4333827347))
            Line((-18.191434443, 18.4333827347), (-18.191434443, 20.9823194891))
            Line((-18.191434443, 20.9823194891), (-14.1366117494, 20.9823194891))
            Line((-14.1366117494, 20.9823194891), (-14.1366117494, 25.1759243172))
            Line((-14.1366117494, 25.1759243172), (-14.0897752112, 27.8063281269))
            Line((-14.0897752112, 27.8063281269), (-17.5147333007, 27.8673123681))
            Line((-17.5147333007, 27.8673123681), (-17.4316894751, 32.5311667793))
            Line((-17.4316894751, 32.5311667793), (-19.1531257722, 32.5618183913))
        make_face(mode=Mode.SUBTRACT)
        with BuildLine():
            ThreePointArc((-21.3630149606, 53.7894412541), (-18.12483498, 49.3327404002), (-21.5196225597, 44.9941450771))
            ThreePointArc((-21.5196225597, 44.9941450771), (-24.7578025403, 49.4508459311), (-21.3630149606, 53.7894412541))
        make_face(mode=Mode.SUBTRACT)
        with BuildLine():
            ThreePointArc((2.5776829571, 18.1501675397), (-4.2151153543, 33.0424312338), (-19.0202724189, 40.0230437517))
            Line((-19.0202724189, 40.0230437517), (-19.1531257722, 32.5618183913))
            Line((-19.1531257722, 32.5618183913), (-17.4316894751, 32.5311667793))
            Line((-17.4316894751, 32.5311667793), (-17.5147333007, 27.8673123681))
            Line((-17.5147333007, 27.8673123681), (-14.0897752112, 27.8063281269))
            Line((-14.0897752112, 27.8063281269), (-14.1366117494, 25.1759243172))
            Line((-14.1366117494, 25.1759243172), (-14.1366117494, 20.9823194891))
            Line((-14.1366117494, 20.9823194891), (-18.191434443, 20.9823194891))
            Line((-18.191434443, 20.9823194891), (-18.191434443, 18.4333827347))
            Line((-18.191434443, 18.4333827347), (-10.9222428873, 17.3005219549))
            Line((-10.9222428873, 17.3005219549), (-8.101772517, 22.3001688719))
            Line((-8.101772517, 22.3001688719), (-10.888718186, 25.1800144253))
            Line((-10.888718186, 25.1800144253), (-6.6744568758, 29.2583294213))
            Line((-6.6744568758, 29.2583294213), (-2.7955498966, 25.250123183))
            Line((-2.7955498966, 25.250123183), (-5.7823848911, 22.3596394062))
            Line((-5.7823848911, 22.3596394062), (-3.8418623153, 18.1501675397))
            Line((-3.8418623153, 18.1501675397), (2.5776829571, 18.1501675397))
        make_face()
        with BuildLine():
            ThreePointArc((-24.1943614945, 40.115172732), (-39.2386461395, 33.6660544705), (-46.5573088461, 19.0250571336))
            Line((-46.5573088461, 19.0250571336), (-40.1418328888, 18.7965188536))
            Line((-40.1418328888, 18.7965188536), (-38.0526815829, 22.9342390088))
            Line((-38.0526815829, 22.9342390088), (-40.934720905, 25.9292229978))
            Line((-40.934720905, 25.9292229978), (-36.9155790608, 29.7967978759))
            Line((-36.9155790608, 29.7967978759), (-32.84917873, 25.5710387789))
            Line((-32.84917873, 25.5710387789), (-35.7368813782, 22.7922350813))
            Line((-35.7368813782, 22.7922350813), (-33.0961882413, 17.6953475839))
            Line((-33.0961882413, 17.6953475839), (-25.7912743076, 18.568704235))
            Line((-25.7912743076, 18.568704235), (-25.7005311791, 21.1160252323))
            Line((-25.7005311791, 21.1160252323), (-29.7527835425, 21.2603784792))
            Line((-29.7527835425, 21.2603784792), (-29.6034895982, 25.4513250038))
            Line((-29.6034895982, 25.4513250038), (-29.55665306, 28.0817288135))
            Line((-29.55665306, 28.0817288135), (-26.1316949705, 28.0207445723))
            Line((-26.1316949705, 28.0207445723), (-26.0486511449, 32.6845989835))
            Line((-26.0486511449, 32.6845989835), (-24.3272148478, 32.6539473716))
            Line((-24.3272148478, 32.6539473716), (-24.1943614945, 40.115172732))
        make_face()
        Polygon((0, 7.263277148), (-22.1914521969, 7.263277148), (-44.3688373522, 8.0533013785), (-44.5459780059, 3.0806481949), (-22.2800506048, 2.287469827), (0, 2.287469827), align=None)
        Polygon((-42.7852563068, 6.1842697226), (-38.6595151567, 6.0372985872), (-38.7103855509, 4.6092761508), (-42.8361267011, 4.7562472863), align=None, mode=Mode.SUBTRACT)
        Polygon((-36.9593330619, 5.8178623416), (-32.1988634885, 5.6482802973), (-32.2511469345, 4.1805909847), (-37.011616508, 4.350173029), align=None, mode=Mode.SUBTRACT)
        Polygon((-30.0360304476, 5.6109514494), (-25.2947680263, 5.4420536208), (-25.3628130835, 3.5319078526), (-30.1040755048, 3.7008056811), align=None, mode=Mode.SUBTRACT)
        with Locations((-16.7828049063, 4.3770501642)):
            Rectangle(F0_W, F0_H, mode=Mode.SUBTRACT)
        with Locations((-9.8661344964, 4.5587262139)):
            Rectangle(F0_W_2, F0_H_2, mode=Mode.SUBTRACT)
        with Locations((-3.7132945145, 4.7373422422)):
            Rectangle(F0_W_3, F0_H_3, mode=Mode.SUBTRACT)
        with BuildLine():
            Line((6.9841672666, 28.7952069193), (2.8851975221, 29.4880755246))
            ThreePointArc((2.8851975221, 29.4880755246), (-7.2201754113, 40.2072674631), (-21.5435338647, 43.6512536062))
            ThreePointArc((-21.5435338647, 43.6512536062), (-35.9804200494, 40.7193676554), (-46.4609945958, 30.3667257165))
            Line((-46.4609945958, 30.3667257165), (-50.5820324143, 29.8202212158))
            Line((-50.5820324143, 29.8202212158), (-50.2755178366, 28.006735892))
            Line((-50.2755178366, 28.006735892), (-45.7521782087, 28.4818015615))
            ThreePointArc((-45.7521782087, 28.4818015615), (-35.6964434395, 38.9289042288), (-21.5694110126, 42.1979577158))
            ThreePointArc((-21.5694110126, 42.1979577158), (-7.5677131963, 38.4280486782), (2.1097264253, 27.6295803487))
            Line((2.1097264253, 27.6295803487), (6.6132862121, 26.9937831908))
            Line((6.6132862121, 26.9937831908), (6.9841672666, 28.7952069193))
        make_face()
        Polygon((0.65387832, 14.6969654201), (-6.4288745034, 14.6969654201), (-3.8528503315, 11.8698262972), (-6.6017220804, 9.8448265344), (0.65387832, 9.8448265344), align=None)
        Polygon((-40.3544344008, 12.5197675079), (-37.679395917, 15.2534070716), (-44.7576590216, 15.5055557954), (-44.9303970315, 10.6564926543), (-37.679395917, 10.3981904904), align=None)
        Polygon((-3.8528503315, 11.8698262972), (-6.4288745034, 14.6969654201), (-9.0568310236, 12.0552075228), (-6.6017220804, 9.8448265344), align=None)
        Polygon((-35.1471528411, 12.5197675079), (-37.679395917, 15.2534070716), (-40.3544344008, 12.5197675079), (-37.679395917, 10.3981904904), align=None)
        with Locations((-16.7828049063, 4.3770501642)):
            Rectangle(F0_W, F0_H)
        Polygon((-25.3628130835, 3.5319078526), (-25.2947680263, 5.4420536208), (-30.0360304476, 5.6109514494), (-30.1040755048, 3.7008056811), align=None)
        with Locations((-9.8661344964, 4.5587262139)):
            Rectangle(F0_W_2, F0_H_2)
        Polygon((-32.2511469345, 4.1805909847), (-32.1988634885, 5.6482802973), (-36.9593330619, 5.8178623416), (-37.011616508, 4.350173029), align=None)
        with Locations((-3.7132945145, 4.7373422422)):
            Rectangle(F0_W_3, F0_H_3)
        Polygon((-38.7103855509, 4.6092761508), (-38.6595151567, 6.0372985872), (-42.7852563068, 6.1842697226), (-42.8361267011, 4.7562472863), align=None)
        Polygon((-14.72098995, 13.2589338481), (-16.3294348053, 11.8467019859), (-14.8276363188, 10.2651806109), (-13.2766810033, 11.7379538419), align=None)
        Polygon((-27.8865820009, 12.0524866506), (-29.4437312744, 13.5210845619), (-30.9412721545, 12.0524866506), (-29.4437312744, 10.525432397), align=None)
    extrude(amount=F1_DEPTH)


solid = f1.part
